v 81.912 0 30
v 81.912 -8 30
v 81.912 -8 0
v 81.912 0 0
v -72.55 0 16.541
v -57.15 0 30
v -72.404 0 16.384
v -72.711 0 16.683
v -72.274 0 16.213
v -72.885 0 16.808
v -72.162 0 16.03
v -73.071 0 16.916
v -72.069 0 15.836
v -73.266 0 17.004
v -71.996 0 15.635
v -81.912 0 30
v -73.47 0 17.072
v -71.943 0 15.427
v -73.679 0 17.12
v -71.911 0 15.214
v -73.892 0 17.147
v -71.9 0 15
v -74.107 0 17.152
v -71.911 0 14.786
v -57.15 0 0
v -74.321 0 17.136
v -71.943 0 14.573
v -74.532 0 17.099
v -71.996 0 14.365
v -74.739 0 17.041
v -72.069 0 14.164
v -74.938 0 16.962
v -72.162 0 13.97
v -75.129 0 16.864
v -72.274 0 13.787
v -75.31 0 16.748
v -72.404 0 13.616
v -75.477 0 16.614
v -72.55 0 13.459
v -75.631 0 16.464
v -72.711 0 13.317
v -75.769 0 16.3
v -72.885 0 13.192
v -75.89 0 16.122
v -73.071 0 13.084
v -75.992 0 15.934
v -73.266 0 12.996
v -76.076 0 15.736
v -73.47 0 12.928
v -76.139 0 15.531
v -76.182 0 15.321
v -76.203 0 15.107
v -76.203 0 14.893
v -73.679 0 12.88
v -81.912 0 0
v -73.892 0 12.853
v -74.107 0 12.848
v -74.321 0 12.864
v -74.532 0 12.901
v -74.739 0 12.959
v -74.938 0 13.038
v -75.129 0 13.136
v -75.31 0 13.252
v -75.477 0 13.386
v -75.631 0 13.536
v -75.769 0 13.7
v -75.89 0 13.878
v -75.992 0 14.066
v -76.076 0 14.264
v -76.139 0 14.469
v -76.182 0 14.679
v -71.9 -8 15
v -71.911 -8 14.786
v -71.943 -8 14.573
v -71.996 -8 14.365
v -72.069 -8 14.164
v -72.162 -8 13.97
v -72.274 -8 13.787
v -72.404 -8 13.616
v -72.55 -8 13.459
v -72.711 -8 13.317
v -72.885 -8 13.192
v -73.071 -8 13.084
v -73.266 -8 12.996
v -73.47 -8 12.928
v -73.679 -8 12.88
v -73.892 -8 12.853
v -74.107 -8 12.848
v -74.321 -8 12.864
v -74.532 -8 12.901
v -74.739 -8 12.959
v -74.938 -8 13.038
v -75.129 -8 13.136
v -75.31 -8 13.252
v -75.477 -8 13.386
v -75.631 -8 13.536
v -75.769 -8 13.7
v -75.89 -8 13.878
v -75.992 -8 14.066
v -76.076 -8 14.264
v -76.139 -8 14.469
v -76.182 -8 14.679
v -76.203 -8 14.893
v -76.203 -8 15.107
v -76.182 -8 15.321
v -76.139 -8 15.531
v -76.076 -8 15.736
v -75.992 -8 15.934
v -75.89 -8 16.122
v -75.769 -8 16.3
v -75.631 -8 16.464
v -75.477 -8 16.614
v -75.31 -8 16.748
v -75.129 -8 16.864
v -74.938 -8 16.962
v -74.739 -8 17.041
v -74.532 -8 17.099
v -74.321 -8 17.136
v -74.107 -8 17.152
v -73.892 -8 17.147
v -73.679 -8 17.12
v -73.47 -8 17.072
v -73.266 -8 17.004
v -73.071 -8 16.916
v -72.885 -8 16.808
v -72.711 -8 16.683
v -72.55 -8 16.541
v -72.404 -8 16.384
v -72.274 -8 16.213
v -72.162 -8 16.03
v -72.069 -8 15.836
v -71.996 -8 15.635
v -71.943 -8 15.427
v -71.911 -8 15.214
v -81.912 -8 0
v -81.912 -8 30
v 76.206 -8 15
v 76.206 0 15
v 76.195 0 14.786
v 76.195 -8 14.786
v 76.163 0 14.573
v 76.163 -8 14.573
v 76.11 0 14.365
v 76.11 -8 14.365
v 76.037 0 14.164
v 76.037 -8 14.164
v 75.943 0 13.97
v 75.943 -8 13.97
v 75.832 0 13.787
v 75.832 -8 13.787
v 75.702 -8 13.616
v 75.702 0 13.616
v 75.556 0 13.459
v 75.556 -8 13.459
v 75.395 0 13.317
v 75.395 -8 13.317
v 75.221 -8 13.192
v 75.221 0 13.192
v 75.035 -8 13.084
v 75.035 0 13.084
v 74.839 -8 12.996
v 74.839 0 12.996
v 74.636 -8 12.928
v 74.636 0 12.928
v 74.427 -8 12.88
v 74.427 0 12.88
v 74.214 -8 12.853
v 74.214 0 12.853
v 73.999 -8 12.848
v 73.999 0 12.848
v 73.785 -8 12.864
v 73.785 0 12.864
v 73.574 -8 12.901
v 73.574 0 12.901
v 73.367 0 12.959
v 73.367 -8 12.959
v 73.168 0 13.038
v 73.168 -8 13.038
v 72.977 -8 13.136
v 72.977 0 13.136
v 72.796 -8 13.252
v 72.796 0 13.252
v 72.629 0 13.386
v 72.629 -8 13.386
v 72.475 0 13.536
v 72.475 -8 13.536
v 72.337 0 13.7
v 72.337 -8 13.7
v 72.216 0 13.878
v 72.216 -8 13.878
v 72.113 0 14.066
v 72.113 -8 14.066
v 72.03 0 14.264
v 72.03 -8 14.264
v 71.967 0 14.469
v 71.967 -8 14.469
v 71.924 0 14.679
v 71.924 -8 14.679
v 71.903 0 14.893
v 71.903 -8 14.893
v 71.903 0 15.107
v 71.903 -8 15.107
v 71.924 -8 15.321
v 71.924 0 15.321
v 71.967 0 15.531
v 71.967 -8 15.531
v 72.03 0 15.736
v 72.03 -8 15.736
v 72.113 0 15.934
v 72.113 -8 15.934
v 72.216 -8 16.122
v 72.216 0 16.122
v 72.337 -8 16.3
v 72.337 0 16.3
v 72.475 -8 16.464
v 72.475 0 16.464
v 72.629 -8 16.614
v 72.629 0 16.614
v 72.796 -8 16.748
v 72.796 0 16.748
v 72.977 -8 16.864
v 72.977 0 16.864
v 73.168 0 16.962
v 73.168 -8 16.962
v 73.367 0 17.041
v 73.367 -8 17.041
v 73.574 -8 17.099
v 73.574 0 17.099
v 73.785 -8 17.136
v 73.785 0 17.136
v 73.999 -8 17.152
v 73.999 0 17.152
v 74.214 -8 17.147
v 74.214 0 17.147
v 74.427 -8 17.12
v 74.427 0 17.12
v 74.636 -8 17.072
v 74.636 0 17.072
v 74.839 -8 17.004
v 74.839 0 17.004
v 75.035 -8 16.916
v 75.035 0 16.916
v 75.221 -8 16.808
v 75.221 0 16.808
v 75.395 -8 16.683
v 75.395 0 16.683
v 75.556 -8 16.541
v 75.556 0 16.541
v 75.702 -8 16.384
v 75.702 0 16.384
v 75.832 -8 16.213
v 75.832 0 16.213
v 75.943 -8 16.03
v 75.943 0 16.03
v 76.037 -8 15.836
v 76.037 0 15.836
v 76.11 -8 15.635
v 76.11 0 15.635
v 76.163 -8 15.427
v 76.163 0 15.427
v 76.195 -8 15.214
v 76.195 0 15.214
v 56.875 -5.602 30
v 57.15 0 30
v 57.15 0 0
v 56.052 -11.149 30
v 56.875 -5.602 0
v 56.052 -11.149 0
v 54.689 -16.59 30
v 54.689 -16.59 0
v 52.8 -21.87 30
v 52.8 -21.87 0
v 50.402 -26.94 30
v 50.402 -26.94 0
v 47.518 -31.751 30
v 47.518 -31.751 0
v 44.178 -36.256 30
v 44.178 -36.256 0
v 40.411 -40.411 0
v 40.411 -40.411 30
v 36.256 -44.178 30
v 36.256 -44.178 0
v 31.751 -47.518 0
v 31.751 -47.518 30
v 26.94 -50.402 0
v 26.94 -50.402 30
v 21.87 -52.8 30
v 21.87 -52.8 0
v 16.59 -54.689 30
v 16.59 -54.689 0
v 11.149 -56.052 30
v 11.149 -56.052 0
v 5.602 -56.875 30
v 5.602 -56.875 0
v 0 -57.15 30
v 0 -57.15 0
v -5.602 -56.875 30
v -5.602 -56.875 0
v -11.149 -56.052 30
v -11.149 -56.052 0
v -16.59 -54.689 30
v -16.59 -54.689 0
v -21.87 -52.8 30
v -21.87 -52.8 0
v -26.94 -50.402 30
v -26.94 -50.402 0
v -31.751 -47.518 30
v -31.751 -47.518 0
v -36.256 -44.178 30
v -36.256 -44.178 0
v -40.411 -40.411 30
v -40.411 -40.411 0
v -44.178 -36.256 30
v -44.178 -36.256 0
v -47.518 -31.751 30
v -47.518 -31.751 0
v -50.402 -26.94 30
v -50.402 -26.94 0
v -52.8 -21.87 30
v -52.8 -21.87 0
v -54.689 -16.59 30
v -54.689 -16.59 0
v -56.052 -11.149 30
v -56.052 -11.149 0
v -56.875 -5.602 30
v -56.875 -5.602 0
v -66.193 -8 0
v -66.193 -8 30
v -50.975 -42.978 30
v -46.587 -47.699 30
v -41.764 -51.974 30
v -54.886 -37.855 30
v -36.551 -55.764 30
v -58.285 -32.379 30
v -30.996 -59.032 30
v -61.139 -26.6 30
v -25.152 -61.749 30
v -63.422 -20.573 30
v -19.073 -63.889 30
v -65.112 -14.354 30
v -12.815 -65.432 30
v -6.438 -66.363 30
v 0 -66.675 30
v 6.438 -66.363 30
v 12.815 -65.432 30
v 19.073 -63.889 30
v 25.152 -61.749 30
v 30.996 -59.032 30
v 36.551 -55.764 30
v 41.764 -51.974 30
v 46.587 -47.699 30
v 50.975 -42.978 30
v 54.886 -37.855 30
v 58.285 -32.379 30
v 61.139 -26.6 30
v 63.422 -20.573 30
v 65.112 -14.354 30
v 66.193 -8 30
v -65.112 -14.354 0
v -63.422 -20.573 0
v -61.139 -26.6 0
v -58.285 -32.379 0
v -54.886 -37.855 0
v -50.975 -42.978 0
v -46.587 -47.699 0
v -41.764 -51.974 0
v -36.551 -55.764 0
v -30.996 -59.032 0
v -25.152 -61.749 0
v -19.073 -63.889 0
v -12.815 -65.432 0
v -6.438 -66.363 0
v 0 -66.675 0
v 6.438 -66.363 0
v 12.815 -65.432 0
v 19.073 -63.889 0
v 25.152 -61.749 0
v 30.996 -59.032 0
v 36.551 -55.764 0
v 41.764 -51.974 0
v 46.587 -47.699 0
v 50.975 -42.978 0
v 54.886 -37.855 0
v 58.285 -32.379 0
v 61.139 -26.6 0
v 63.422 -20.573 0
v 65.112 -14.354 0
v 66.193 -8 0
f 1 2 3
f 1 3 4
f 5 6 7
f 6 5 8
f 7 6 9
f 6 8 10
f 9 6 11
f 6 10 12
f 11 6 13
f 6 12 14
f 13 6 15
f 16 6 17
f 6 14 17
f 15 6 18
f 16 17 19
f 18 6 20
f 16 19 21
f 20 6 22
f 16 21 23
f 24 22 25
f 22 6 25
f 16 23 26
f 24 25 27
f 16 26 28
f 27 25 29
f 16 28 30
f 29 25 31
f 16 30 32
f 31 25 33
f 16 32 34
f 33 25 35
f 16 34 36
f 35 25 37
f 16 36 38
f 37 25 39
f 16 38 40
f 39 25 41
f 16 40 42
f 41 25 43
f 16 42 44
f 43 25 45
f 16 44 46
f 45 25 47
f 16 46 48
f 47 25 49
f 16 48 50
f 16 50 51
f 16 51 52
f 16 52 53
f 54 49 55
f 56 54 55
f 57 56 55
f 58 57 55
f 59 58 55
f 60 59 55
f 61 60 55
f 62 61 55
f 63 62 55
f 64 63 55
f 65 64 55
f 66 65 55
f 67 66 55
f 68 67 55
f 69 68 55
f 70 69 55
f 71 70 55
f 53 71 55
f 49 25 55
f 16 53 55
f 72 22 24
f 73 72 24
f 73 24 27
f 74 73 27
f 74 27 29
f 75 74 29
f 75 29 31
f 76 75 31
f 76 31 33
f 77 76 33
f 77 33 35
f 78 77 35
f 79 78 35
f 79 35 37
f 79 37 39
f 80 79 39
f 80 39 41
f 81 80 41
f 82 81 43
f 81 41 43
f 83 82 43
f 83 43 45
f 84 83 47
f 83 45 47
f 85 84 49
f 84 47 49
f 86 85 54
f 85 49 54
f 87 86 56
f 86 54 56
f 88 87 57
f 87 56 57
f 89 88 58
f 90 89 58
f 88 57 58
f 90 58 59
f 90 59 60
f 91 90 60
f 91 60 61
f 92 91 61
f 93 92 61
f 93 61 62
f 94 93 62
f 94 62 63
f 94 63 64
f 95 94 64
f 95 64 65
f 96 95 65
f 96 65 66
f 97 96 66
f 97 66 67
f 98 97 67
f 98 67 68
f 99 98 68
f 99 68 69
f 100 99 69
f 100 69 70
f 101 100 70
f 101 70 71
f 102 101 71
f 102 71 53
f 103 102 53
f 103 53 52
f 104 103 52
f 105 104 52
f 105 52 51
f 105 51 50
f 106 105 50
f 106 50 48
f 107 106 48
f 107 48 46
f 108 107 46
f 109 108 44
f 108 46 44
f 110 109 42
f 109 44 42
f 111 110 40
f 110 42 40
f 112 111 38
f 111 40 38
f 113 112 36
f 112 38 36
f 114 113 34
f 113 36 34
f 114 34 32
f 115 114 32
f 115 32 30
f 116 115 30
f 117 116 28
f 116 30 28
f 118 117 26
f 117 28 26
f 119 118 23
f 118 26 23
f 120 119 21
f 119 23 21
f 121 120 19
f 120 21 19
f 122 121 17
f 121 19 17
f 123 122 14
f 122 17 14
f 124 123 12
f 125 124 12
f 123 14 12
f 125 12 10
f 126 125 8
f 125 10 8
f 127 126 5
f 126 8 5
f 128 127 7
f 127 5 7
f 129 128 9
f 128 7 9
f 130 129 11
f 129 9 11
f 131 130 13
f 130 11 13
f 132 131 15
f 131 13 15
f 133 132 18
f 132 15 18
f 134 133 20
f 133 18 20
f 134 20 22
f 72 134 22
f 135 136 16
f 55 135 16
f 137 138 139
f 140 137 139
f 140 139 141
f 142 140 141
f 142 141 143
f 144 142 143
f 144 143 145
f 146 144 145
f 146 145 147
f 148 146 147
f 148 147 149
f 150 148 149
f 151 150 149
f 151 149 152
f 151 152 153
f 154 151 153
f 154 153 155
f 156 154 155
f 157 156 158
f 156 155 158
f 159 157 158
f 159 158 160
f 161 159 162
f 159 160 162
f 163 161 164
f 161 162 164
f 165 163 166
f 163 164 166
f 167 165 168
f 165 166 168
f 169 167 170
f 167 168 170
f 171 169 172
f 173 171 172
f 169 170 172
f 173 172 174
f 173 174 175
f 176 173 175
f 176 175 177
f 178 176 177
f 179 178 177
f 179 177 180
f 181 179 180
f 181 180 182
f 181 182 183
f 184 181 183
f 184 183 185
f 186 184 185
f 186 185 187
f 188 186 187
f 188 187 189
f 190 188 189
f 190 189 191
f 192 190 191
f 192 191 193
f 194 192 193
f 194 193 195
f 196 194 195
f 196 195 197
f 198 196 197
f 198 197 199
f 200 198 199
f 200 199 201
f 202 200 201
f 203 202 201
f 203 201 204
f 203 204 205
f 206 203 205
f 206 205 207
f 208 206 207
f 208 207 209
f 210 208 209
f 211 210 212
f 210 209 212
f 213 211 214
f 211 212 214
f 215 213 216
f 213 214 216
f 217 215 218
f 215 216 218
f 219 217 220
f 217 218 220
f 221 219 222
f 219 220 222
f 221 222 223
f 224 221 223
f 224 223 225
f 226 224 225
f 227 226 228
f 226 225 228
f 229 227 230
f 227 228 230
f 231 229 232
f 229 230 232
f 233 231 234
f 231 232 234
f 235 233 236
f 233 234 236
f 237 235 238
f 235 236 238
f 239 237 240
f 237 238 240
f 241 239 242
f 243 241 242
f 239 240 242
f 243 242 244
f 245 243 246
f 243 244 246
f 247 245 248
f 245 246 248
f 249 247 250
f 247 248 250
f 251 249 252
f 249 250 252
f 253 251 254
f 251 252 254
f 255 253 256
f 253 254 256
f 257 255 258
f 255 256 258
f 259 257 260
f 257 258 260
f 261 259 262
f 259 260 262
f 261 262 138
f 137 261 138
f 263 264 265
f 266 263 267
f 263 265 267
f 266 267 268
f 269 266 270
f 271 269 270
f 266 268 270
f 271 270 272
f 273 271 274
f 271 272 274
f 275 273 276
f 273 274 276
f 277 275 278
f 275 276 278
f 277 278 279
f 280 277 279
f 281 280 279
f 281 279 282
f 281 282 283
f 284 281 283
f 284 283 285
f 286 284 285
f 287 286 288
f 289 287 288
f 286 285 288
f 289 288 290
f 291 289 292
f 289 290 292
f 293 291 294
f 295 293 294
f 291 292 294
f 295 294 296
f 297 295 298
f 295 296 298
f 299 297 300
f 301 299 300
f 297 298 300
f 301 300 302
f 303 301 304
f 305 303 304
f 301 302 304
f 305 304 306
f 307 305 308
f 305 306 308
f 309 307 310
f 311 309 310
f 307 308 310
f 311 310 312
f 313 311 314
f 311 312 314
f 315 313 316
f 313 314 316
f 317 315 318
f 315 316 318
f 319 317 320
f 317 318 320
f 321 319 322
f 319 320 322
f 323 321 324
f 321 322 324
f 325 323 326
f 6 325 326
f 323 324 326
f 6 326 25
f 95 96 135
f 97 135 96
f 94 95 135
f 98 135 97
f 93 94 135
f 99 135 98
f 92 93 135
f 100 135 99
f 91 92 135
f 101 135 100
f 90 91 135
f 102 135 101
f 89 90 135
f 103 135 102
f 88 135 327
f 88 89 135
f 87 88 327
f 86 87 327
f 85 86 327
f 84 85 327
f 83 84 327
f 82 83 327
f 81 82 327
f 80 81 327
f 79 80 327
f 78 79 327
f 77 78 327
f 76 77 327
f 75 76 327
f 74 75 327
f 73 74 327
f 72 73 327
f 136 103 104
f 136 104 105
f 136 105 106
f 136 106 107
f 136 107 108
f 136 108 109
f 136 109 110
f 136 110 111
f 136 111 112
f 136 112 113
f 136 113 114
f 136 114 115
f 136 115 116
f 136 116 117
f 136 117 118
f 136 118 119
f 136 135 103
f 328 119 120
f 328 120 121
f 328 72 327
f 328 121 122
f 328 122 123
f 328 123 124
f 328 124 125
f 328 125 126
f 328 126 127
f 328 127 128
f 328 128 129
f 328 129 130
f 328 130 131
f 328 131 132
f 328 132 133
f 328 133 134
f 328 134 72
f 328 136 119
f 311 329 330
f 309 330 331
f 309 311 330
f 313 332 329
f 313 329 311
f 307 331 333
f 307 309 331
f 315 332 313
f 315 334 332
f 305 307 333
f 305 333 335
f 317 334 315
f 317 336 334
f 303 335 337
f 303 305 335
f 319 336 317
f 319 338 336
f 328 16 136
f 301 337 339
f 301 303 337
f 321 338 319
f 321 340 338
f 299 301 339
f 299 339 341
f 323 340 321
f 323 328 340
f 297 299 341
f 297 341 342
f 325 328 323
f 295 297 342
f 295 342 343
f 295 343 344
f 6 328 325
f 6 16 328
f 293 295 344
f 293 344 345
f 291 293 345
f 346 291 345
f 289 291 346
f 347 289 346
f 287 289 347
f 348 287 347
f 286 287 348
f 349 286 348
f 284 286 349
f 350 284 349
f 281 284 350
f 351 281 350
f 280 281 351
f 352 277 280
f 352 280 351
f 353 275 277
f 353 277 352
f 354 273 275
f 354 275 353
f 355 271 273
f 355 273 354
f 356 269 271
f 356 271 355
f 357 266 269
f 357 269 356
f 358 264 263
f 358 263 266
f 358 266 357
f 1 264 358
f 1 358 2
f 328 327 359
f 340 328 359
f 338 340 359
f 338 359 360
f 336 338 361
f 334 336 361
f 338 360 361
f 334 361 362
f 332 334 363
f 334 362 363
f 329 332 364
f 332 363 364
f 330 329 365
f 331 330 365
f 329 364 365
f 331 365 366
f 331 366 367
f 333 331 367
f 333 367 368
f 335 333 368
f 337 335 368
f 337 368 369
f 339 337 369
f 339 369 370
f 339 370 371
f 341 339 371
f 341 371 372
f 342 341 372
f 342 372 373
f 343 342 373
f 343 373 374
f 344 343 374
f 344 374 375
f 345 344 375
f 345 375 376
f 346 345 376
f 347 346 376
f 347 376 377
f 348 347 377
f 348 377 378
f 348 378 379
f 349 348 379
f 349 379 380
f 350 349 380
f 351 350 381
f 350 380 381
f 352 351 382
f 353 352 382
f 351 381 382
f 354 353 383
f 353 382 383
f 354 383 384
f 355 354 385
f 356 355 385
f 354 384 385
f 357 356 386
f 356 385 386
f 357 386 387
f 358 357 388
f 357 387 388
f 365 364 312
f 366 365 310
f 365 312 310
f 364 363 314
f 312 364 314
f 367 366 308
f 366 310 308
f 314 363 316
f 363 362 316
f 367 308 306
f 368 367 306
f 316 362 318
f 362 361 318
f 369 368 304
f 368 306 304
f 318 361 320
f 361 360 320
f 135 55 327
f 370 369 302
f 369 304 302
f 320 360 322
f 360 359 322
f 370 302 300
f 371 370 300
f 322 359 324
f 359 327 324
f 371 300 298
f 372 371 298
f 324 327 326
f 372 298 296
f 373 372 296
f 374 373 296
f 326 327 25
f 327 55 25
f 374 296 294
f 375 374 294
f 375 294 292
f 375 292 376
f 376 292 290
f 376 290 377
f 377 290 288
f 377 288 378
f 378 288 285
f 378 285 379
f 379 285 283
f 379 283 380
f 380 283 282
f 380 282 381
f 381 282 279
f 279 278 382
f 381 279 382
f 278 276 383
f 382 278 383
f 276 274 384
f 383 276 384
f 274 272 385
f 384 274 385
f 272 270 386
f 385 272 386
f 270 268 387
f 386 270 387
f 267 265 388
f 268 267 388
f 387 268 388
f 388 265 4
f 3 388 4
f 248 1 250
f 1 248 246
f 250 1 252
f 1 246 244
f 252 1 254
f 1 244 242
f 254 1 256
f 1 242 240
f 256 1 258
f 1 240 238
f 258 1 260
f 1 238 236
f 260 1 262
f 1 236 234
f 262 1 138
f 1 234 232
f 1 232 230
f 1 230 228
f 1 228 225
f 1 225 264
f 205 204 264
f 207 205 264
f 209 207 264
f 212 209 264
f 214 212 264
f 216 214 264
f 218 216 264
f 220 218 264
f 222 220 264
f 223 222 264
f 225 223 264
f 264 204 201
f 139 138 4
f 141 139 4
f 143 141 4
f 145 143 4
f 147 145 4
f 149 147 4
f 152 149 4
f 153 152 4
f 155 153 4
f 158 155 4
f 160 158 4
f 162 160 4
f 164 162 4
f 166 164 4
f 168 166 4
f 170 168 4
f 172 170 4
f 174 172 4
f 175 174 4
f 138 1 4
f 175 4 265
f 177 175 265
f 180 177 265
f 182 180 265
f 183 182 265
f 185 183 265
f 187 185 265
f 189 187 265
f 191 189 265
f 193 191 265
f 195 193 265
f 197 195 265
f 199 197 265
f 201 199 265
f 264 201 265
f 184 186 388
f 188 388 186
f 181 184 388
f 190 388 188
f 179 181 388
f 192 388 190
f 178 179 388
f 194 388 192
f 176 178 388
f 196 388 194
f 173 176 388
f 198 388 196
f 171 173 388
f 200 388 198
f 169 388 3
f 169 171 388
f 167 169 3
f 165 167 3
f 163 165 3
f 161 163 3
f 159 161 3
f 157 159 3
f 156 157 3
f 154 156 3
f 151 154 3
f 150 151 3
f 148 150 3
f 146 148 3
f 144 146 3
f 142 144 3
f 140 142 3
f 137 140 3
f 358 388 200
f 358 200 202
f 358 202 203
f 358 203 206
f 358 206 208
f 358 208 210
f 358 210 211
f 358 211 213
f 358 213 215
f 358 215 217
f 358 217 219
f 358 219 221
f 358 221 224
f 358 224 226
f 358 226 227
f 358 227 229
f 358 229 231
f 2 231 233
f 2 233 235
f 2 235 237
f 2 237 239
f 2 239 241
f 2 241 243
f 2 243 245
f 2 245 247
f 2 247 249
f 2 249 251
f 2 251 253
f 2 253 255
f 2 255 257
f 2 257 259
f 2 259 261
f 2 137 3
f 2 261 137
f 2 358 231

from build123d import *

# Parameters (mm, degrees)
BOSS_EXTRUDE1_DEPTH = 30
SKETCH2_W           = 20
SKETCH2_H           = 8
BOSS_EXTRUDE2_DEPTH = 30
SKETCH3_R           = 2.15265
CUT_EXTRUDE1_DEPTH  = 67.675


with BuildPart() as part:
    # Sketch1 → Boss-Extrude1 (new body)
    with BuildSketch(Plane.XY):
        with BuildLine():
            Line((66.675, 0), (57.15, 0))
            ThreePointArc((57.15, 0), (0, -57.15), (-57.15, 0))
            Line((-57.15, 0), (-66.675, 0))
            ThreePointArc((-66.675, 0), (0, -66.675), (66.675, 0))
        make_face()
    extrude(amount=BOSS_EXTRUDE1_DEPTH)

    # Sketch2 → Boss-Extrude2 (add)
    with BuildSketch(Plane.XY.offset(30)):
        with Locations((71.9125, -4)):
            Rectangle(SKETCH2_W, SKETCH2_H)
        with Locations((-71.9125, -4)):
            Rectangle(SKETCH2_W, SKETCH2_H)
    extrude(amount=-BOSS_EXTRUDE2_DEPTH)

    # Sketch3 → Cut-Extrude1 (cut, through all)
    with BuildSketch(Plane(origin=(0, 0, 0), x_dir=(1, 0, 0), z_dir=(0, 1, 0))):
        with Locations((-74.052910047, -15)):
            Circle(SKETCH3_R)
        with Locations((74.052910047, -15)):
            Circle(SKETCH3_R)
    extrude(amount=-CUT_EXTRUDE1_DEPTH, mode=Mode.SUBTRACT)


solid = part.part
